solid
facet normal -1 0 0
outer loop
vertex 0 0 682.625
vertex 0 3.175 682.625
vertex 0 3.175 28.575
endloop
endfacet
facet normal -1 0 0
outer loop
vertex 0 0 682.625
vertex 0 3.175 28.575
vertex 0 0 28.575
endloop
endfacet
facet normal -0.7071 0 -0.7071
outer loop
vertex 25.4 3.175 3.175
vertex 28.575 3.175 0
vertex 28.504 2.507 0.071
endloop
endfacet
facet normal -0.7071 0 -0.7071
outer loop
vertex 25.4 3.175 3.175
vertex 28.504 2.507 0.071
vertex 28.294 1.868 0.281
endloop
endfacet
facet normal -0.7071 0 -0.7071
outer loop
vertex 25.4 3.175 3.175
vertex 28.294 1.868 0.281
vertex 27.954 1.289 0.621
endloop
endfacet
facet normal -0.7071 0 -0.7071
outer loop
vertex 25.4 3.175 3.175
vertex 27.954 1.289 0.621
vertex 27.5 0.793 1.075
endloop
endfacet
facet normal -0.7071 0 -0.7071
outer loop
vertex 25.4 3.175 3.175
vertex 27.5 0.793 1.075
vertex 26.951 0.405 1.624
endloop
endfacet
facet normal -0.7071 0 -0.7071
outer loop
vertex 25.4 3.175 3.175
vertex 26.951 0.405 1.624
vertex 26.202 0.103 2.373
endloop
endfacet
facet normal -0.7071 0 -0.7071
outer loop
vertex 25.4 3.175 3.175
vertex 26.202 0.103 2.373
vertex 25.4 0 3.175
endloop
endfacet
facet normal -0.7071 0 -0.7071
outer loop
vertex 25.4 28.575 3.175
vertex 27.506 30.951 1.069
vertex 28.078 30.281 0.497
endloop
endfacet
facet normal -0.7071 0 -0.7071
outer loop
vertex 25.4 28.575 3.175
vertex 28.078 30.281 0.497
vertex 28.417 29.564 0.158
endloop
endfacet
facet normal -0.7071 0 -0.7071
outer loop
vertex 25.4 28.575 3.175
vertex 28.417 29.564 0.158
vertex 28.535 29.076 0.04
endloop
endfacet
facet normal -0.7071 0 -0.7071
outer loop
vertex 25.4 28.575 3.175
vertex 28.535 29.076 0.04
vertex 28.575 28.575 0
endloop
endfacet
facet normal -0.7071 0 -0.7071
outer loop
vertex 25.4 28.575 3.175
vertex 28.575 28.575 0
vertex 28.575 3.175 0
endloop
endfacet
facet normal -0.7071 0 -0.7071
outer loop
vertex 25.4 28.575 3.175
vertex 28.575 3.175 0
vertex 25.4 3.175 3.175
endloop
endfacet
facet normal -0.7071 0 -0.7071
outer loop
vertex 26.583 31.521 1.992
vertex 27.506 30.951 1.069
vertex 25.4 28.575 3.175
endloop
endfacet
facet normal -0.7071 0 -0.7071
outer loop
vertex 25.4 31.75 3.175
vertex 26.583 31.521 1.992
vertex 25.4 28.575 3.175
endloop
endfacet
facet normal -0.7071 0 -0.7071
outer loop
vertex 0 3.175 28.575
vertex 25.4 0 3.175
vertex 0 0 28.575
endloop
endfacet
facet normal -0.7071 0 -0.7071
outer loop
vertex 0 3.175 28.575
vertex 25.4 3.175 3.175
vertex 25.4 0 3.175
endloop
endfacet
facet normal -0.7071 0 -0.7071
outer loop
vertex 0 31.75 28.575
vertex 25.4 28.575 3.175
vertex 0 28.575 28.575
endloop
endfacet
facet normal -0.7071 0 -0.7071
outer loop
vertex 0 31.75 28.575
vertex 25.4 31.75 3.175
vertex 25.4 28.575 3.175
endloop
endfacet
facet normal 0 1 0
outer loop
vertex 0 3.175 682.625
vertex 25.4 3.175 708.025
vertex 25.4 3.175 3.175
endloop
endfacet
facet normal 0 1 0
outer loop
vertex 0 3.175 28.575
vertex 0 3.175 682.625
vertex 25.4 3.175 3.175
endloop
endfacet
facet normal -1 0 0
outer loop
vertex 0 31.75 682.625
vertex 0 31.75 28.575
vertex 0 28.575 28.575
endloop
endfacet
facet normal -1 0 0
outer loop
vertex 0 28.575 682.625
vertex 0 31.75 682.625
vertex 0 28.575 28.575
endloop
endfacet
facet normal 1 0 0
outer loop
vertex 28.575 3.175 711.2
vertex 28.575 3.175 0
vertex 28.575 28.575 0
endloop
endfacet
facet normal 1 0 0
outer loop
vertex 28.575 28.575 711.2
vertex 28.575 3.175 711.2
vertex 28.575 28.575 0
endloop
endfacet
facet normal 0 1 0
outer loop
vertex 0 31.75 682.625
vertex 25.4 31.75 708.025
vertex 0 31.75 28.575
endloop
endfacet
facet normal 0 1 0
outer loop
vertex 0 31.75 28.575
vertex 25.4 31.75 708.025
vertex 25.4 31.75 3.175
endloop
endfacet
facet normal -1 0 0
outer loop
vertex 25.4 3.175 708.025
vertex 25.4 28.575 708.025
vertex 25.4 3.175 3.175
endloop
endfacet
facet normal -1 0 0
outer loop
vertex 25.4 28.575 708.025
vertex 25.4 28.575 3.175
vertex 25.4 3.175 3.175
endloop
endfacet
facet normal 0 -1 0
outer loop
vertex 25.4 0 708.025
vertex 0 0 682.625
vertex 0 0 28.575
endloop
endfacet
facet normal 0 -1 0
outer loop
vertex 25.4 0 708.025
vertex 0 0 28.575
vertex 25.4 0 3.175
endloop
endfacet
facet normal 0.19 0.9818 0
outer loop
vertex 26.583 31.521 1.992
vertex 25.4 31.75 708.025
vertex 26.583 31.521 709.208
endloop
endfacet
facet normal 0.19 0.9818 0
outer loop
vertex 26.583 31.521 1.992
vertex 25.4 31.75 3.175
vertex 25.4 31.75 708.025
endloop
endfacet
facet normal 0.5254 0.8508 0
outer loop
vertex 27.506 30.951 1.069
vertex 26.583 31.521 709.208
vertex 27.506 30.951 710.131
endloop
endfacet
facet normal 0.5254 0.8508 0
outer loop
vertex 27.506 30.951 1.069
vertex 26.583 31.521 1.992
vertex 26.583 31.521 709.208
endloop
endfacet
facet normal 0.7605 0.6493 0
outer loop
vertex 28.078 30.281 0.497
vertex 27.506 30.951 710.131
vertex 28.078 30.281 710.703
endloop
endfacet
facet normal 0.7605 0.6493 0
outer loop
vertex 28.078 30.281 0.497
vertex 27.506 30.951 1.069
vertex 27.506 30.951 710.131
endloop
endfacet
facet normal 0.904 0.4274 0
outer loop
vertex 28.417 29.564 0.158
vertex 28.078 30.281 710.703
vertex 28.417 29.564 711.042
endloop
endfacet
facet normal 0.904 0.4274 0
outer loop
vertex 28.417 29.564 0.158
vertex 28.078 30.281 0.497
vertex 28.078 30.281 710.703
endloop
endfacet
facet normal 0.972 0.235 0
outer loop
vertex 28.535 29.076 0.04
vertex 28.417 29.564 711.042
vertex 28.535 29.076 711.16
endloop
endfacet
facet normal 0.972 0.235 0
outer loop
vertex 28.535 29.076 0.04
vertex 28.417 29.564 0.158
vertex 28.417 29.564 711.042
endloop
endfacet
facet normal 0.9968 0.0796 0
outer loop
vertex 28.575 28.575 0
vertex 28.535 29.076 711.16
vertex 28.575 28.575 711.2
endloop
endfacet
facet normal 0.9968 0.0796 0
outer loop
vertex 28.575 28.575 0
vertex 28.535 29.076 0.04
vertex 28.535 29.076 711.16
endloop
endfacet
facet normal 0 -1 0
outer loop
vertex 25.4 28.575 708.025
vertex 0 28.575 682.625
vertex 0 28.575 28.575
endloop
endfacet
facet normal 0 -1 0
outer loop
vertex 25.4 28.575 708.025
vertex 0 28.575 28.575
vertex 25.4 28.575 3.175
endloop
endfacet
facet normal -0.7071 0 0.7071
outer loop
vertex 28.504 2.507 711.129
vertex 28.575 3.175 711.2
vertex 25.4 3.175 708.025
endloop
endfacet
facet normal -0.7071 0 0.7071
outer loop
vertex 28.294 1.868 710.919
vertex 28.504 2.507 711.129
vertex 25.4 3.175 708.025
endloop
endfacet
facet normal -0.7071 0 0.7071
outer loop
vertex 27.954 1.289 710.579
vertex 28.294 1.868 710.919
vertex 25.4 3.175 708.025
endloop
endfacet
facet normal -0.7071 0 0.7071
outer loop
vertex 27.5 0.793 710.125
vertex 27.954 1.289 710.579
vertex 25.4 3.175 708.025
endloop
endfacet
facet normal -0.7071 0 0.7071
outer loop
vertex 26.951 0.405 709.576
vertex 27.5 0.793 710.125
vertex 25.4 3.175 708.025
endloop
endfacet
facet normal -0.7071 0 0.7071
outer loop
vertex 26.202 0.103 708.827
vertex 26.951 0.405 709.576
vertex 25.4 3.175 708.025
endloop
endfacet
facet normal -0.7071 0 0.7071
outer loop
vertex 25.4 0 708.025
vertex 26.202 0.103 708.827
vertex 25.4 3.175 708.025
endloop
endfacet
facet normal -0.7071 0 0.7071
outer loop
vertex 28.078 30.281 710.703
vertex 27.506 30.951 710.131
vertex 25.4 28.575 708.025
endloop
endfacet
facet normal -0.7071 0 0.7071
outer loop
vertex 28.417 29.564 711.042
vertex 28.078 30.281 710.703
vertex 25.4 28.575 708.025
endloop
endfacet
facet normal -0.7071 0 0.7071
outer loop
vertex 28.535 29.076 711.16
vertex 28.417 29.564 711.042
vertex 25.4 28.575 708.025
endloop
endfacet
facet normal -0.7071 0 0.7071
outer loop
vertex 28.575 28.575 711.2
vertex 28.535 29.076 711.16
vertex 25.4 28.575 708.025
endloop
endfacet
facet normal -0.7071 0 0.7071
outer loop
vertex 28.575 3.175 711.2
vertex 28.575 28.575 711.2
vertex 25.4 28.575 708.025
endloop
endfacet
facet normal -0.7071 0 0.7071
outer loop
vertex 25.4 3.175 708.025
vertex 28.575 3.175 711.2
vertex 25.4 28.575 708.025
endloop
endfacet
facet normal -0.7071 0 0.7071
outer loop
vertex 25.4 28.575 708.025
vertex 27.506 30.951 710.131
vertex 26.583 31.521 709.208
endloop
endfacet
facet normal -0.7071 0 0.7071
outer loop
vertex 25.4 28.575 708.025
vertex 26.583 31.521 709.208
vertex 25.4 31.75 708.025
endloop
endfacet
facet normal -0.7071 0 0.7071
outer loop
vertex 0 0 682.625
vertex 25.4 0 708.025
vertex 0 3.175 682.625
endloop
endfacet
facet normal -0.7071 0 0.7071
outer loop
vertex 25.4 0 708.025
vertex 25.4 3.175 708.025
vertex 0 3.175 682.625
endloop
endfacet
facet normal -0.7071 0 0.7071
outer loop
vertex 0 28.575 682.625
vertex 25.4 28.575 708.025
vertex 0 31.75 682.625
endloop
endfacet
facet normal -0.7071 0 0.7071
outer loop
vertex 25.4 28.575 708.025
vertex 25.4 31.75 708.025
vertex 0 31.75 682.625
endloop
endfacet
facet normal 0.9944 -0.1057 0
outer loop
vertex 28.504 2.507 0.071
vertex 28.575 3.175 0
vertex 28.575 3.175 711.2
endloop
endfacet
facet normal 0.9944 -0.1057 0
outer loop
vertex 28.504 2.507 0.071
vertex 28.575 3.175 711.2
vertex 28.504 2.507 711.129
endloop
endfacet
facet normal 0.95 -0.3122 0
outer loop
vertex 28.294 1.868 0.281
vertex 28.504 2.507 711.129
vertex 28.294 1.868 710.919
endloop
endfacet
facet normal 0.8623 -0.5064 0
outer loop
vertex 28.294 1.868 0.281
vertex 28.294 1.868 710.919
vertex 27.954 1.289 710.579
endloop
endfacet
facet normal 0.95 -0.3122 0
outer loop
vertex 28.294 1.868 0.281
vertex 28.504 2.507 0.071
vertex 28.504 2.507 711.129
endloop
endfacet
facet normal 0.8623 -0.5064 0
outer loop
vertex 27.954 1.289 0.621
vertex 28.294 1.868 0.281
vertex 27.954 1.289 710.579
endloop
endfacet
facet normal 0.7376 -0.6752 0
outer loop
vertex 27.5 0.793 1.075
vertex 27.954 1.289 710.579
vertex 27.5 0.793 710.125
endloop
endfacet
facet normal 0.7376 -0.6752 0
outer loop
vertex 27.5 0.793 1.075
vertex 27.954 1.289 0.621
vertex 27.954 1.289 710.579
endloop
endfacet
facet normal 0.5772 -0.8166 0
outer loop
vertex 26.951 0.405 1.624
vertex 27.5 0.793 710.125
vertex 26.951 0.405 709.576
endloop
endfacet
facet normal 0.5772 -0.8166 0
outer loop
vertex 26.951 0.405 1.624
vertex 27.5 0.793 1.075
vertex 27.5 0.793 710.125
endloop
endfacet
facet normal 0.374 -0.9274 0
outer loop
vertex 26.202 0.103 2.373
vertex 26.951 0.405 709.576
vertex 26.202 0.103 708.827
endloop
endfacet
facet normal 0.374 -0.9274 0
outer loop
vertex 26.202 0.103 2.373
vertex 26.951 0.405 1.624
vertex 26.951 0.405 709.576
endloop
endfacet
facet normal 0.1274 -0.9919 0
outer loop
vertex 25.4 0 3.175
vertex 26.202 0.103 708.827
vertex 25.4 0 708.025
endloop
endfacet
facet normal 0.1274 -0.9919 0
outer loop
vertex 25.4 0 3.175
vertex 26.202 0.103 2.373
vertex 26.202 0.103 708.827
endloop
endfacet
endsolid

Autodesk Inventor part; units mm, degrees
ref_plane "YZ Plane" through (0, 0, 0) normal (1, 0, 0) x (0, 1, 0)
ref_plane "XZ Plane" through (0, 0, 0) normal (0, 1, 0) x (-1, 0, 0)
ref_plane "XY Plane" through (0, 0, 0) normal (0, 0, 1) x (1, 0, 0)
sketch "Sketch1" plane through (0, 0, 0) normal (0, 0, 1) x (1, 0, 0)
  line L0 (0, 0) -> (25.4, 0)
  line L1 (28.575, 3.175) -> (28.575, 28.575)
  line L2 (25.4, 31.75) -> (0, 31.75)
  line L3 (0, 31.75) -> (0, 28.575)
  line L4 (0, 28.575) -> (25.4, 28.575)
  line L5 (25.4, 28.575) -> (25.4, 3.175)
  line L6 (25.4, 3.175) -> (0, 3.175)
  line L7 (0, 3.175) -> (0, 0)
  arc A0 (28.575, 28.575) -> (25.4, 31.75) centre (25.4, 28.575) ccw
  arc A1 (25.4, 0) -> (28.575, 3.175) centre (25.4, 3.175) ccw
  point P0 (28.575, 0)
  point P1 (28.575, 31.75)
  dimension "d0" = 28.575
  dimension "d1" = 31.75
  dimension "d2" = 3.175
  dimension "d3" = 25.4
  dimension "d4" = 25.4
  dimension "d5" = 3.175
extrude "Extrusion1" add sketch "Sketch1" along normal blind 711.2
sketch "Sketch2" plane through (0, 31.75, 0) normal (0, 1, 0) x (1, 0, 0)
  line L0 (25.4, 0) -> (28.575, 0) projected
  line L1 (25.4, 0) -> (28.575, 0)
  line L2 (28.575, 0) -> (0, -28.575)
  line L3 (0, 0) -> (0, -711.2) projected
  line L4 (0, -28.575) -> (0, 0)
  line L5 (0, 0) -> (28.575, 0)
  dimension "d8" = 45
extrude "Extrusion2" cut sketch "Sketch2" against normal blind 711.2
sketch "Sketch3" plane through (0, 31.75, 711.2) normal (0, 1, 0) x (1, 0, 0)
  line L0 (0, 0) -> (25.4, 0) projected
  line L1 (25.4, 0) -> (28.575, 0) projected
  line L2 (25.4, 0) -> (28.575, 0)
  line L3 (28.575, 0) -> (0, 28.575)
  line L4 (0, 682.625) -> (0, 0) projected
  line L5 (0, 28.575) -> (0, 0)
  line L6 (0, 0) -> (28.575, 0)
  point P0 (0, 711.2)
  dimension "d11" = 45
extrude "Extrusion3" cut sketch "Sketch3" against normal blind 711.2
properties part number "Chasis 28 piece"
